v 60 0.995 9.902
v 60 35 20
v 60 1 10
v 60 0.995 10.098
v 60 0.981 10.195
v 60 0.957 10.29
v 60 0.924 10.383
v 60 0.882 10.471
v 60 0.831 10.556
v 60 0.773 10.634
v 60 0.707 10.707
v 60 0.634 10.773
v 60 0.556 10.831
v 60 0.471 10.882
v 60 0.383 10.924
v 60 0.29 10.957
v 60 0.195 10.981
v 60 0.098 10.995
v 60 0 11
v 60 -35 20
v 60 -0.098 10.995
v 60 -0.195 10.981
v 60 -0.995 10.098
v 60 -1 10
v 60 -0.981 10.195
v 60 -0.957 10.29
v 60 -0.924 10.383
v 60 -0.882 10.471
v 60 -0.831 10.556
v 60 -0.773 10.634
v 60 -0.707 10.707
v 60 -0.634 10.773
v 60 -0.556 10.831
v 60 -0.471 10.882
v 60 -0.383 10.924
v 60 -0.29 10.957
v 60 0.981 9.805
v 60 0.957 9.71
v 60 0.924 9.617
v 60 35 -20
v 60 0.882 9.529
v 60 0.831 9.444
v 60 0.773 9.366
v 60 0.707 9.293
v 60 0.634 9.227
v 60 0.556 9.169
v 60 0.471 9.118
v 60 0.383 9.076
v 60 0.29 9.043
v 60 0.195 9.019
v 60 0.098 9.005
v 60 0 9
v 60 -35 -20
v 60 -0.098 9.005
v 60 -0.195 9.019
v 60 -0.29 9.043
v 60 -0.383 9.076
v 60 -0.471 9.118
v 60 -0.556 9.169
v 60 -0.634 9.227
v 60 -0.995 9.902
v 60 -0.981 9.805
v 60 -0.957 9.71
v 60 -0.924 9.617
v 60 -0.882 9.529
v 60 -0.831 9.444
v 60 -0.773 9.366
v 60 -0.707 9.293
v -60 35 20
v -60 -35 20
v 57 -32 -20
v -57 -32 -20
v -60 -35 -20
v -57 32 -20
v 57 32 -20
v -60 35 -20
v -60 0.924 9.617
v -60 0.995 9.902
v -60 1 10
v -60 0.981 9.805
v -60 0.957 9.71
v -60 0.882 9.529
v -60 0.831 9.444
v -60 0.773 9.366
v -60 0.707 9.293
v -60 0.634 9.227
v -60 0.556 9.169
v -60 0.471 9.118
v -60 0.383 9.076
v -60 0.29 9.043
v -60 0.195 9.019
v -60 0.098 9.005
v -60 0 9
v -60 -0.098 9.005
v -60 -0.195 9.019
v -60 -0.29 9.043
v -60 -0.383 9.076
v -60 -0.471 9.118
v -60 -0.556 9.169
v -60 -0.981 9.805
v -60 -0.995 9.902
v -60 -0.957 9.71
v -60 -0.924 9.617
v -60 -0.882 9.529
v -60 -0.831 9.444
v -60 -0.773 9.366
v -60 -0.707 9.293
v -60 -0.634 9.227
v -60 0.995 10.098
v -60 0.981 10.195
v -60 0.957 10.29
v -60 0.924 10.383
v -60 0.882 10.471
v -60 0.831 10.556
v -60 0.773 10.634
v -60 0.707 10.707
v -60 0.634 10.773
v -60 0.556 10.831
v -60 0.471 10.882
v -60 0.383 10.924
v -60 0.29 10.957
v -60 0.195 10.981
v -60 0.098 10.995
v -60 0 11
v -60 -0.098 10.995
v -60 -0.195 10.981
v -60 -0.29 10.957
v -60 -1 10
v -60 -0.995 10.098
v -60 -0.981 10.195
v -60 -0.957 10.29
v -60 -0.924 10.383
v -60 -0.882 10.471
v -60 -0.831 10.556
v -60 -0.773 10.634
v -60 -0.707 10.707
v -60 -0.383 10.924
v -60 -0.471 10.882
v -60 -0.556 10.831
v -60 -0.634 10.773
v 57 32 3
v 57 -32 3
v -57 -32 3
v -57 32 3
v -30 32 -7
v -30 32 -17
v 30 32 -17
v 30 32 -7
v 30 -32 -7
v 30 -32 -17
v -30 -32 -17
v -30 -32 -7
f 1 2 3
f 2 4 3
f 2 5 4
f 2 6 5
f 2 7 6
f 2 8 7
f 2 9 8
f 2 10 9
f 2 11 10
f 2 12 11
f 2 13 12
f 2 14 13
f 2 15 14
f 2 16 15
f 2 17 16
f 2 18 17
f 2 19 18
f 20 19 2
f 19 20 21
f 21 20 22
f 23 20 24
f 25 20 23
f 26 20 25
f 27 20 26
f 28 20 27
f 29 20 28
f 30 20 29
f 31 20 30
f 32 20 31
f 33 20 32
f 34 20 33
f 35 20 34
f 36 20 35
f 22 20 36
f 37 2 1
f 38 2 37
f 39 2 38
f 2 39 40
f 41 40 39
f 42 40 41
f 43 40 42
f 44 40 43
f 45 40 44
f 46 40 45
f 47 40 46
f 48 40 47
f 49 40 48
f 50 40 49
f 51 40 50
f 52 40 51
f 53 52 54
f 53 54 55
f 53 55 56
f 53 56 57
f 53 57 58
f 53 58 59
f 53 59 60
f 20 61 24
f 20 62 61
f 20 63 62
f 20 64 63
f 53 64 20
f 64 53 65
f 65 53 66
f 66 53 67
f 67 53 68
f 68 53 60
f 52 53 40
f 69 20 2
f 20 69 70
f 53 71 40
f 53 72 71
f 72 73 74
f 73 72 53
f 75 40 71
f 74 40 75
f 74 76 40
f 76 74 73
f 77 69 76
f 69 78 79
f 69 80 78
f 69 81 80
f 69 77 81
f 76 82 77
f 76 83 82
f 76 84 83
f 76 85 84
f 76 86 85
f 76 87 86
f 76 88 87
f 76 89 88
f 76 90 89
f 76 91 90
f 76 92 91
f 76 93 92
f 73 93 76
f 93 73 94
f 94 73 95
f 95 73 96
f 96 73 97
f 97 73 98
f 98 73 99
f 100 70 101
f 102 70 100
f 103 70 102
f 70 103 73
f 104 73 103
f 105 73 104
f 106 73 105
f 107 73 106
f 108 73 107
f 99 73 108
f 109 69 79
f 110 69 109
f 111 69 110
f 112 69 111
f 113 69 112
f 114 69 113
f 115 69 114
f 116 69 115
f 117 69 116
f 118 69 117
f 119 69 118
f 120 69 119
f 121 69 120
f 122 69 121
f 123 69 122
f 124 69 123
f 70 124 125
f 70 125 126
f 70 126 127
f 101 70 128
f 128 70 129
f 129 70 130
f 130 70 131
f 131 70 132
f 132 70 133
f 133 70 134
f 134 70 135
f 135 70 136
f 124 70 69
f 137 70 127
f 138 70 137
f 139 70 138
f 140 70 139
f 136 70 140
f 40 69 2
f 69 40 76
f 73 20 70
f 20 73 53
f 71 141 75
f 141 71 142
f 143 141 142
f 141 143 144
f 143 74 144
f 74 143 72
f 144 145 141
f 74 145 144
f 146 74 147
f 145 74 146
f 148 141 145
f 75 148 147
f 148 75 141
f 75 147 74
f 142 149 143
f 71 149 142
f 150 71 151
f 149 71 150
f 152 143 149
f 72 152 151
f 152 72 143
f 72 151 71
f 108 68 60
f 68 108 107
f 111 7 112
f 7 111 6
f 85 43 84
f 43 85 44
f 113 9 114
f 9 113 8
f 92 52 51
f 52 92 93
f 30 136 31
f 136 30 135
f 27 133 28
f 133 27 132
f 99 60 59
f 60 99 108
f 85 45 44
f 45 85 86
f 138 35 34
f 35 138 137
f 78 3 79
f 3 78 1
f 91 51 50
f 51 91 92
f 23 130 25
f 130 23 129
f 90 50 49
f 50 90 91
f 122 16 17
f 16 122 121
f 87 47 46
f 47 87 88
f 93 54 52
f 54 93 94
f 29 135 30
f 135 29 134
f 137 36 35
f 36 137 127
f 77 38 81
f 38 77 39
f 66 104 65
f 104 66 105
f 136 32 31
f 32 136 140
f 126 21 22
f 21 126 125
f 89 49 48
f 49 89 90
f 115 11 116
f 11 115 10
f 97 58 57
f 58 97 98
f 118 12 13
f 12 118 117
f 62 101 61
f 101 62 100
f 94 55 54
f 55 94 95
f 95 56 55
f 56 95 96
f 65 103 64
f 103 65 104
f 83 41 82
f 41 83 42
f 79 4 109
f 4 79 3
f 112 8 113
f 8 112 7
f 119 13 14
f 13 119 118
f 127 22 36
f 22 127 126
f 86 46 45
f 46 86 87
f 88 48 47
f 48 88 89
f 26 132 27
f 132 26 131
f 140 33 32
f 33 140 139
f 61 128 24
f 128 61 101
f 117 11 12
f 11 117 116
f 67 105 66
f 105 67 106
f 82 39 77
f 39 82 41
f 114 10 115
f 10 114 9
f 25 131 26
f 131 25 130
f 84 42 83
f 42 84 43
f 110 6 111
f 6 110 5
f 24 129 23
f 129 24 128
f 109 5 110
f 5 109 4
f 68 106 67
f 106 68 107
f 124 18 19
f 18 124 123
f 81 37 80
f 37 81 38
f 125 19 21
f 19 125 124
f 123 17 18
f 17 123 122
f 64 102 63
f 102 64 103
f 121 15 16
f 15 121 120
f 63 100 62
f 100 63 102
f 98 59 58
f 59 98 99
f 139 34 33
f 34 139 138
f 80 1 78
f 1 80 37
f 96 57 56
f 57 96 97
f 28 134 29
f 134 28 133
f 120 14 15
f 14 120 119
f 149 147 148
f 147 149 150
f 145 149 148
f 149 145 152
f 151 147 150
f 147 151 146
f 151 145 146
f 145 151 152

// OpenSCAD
// Buffer tank for mini horizontal gel-electrophoresis box
// Corrected: Centered on XY plane, holes centered on Y axis.

// --- Dimensions ---
length_outer = 120.0;    // X dimension
width_outer  = 70.0;     // Y dimension
height_outer = 40.0;     // Z dimension
wall_thick   = 3.0;      // Wall thickness
floor_thick  = 3.0;      // Floor thickness
platform_len = 60.0;      // Length of the central platform in X
platform_h_top = 13.0;   // Height of platform top from the absolute bottom (z=13)
hole_dia     = 2.0;      // Diameter of electrode wire holes
hole_y       = 0.0;      // Y position of holes (centered on Y axis)
hole_z       = 30.0;     // Z position of holes

$fn = 64;

// --- Calculations ---
inner_x = length_outer - 2 * wall_thick;
inner_y = width_outer - 2 * wall_thick;

module tank_body() {
    difference() {
        // Main outer block
        cube([length_outer, width_outer, height_outer], center = true);
        
        // Hollow out the interior
        // We must shift the cube because cube(center=true) is centered on Z=0
        // The floor is at Z = -height_outer/2 + floor_thick
        translate([0, 0, floor_thick - height_outer/2])
            cube([inner_x, inner_y, height_outer], center = true);
        
        // Electrode holes (drilled through X-end walls)
        // Holes are horizontal along X, passing through the center of the Y-axis
        translate([0, hole_y, hole_z - height_outer/2])
            rotate([0, 90, 0])
                cylinder(h = length_outer + 2, d = hole_dia, center = true);
    }
}

module platform() {
    // The platform is inside the tank.
    // It is 60mm long in X, centered.
    // Its top is at z = 13 (absolute).
    // The floor top is at z = 3 (absolute).
    
    platform_z_bottom = floor_thick;
    platform_z_top   = platform_h_top;
    
    // Since the whole model is centered on Z=0, we must shift the platform
    // The absolute Z of the platform top is 13.
    // The absolute Z of the platform bottom is 3.
    // In a centered model, the Z-offset is (Z_absolute - height_outer/2)
    
    z_offset = (platform_z_bottom + platform_z_top) / 2 - height_outer/2;
    z_height = platform_z_top - platform_z_bottom;

    translate([0, 0, z_offset])
        cube([platform_len, inner_y, z_height], center = true);
}

// --- Assembly ---
// We use difference to ensure the holes are cut through the union of the shell and platform
difference() {
    union() {
        tank_body();
        platform();
    }
    
    // Re-subtracting the holes to ensure they cut through the platform if they intersect
    // (Though at Z=30 they don't intersect the platform at Z=13)
    translate([0, hole_y, hole_z - height_outer/2])
        rotate([0, 90, 0])
            cylinder(h = length_outer + 2, d = hole_dia, center = true);
}

// Note: The tank is built from Z = -20 to Z = +20. 
// To make it sit on the bed at Z=0, we translate the whole assembly.
// However, the instructions say "it rests on the XY plane at z = 0 and builds upward (+Z)".
// I will apply a final translation to the whole assembly.

// Final assembly with translation to sit on Z=0
translate([0, 0, -height_outer/2]) {
    // The logic above is wrapped in a way that the final result is:
    // (The code above is the logic, I will wrap it in a final translation)
}

// Re-writing the final block to be clean and follow all rules:
